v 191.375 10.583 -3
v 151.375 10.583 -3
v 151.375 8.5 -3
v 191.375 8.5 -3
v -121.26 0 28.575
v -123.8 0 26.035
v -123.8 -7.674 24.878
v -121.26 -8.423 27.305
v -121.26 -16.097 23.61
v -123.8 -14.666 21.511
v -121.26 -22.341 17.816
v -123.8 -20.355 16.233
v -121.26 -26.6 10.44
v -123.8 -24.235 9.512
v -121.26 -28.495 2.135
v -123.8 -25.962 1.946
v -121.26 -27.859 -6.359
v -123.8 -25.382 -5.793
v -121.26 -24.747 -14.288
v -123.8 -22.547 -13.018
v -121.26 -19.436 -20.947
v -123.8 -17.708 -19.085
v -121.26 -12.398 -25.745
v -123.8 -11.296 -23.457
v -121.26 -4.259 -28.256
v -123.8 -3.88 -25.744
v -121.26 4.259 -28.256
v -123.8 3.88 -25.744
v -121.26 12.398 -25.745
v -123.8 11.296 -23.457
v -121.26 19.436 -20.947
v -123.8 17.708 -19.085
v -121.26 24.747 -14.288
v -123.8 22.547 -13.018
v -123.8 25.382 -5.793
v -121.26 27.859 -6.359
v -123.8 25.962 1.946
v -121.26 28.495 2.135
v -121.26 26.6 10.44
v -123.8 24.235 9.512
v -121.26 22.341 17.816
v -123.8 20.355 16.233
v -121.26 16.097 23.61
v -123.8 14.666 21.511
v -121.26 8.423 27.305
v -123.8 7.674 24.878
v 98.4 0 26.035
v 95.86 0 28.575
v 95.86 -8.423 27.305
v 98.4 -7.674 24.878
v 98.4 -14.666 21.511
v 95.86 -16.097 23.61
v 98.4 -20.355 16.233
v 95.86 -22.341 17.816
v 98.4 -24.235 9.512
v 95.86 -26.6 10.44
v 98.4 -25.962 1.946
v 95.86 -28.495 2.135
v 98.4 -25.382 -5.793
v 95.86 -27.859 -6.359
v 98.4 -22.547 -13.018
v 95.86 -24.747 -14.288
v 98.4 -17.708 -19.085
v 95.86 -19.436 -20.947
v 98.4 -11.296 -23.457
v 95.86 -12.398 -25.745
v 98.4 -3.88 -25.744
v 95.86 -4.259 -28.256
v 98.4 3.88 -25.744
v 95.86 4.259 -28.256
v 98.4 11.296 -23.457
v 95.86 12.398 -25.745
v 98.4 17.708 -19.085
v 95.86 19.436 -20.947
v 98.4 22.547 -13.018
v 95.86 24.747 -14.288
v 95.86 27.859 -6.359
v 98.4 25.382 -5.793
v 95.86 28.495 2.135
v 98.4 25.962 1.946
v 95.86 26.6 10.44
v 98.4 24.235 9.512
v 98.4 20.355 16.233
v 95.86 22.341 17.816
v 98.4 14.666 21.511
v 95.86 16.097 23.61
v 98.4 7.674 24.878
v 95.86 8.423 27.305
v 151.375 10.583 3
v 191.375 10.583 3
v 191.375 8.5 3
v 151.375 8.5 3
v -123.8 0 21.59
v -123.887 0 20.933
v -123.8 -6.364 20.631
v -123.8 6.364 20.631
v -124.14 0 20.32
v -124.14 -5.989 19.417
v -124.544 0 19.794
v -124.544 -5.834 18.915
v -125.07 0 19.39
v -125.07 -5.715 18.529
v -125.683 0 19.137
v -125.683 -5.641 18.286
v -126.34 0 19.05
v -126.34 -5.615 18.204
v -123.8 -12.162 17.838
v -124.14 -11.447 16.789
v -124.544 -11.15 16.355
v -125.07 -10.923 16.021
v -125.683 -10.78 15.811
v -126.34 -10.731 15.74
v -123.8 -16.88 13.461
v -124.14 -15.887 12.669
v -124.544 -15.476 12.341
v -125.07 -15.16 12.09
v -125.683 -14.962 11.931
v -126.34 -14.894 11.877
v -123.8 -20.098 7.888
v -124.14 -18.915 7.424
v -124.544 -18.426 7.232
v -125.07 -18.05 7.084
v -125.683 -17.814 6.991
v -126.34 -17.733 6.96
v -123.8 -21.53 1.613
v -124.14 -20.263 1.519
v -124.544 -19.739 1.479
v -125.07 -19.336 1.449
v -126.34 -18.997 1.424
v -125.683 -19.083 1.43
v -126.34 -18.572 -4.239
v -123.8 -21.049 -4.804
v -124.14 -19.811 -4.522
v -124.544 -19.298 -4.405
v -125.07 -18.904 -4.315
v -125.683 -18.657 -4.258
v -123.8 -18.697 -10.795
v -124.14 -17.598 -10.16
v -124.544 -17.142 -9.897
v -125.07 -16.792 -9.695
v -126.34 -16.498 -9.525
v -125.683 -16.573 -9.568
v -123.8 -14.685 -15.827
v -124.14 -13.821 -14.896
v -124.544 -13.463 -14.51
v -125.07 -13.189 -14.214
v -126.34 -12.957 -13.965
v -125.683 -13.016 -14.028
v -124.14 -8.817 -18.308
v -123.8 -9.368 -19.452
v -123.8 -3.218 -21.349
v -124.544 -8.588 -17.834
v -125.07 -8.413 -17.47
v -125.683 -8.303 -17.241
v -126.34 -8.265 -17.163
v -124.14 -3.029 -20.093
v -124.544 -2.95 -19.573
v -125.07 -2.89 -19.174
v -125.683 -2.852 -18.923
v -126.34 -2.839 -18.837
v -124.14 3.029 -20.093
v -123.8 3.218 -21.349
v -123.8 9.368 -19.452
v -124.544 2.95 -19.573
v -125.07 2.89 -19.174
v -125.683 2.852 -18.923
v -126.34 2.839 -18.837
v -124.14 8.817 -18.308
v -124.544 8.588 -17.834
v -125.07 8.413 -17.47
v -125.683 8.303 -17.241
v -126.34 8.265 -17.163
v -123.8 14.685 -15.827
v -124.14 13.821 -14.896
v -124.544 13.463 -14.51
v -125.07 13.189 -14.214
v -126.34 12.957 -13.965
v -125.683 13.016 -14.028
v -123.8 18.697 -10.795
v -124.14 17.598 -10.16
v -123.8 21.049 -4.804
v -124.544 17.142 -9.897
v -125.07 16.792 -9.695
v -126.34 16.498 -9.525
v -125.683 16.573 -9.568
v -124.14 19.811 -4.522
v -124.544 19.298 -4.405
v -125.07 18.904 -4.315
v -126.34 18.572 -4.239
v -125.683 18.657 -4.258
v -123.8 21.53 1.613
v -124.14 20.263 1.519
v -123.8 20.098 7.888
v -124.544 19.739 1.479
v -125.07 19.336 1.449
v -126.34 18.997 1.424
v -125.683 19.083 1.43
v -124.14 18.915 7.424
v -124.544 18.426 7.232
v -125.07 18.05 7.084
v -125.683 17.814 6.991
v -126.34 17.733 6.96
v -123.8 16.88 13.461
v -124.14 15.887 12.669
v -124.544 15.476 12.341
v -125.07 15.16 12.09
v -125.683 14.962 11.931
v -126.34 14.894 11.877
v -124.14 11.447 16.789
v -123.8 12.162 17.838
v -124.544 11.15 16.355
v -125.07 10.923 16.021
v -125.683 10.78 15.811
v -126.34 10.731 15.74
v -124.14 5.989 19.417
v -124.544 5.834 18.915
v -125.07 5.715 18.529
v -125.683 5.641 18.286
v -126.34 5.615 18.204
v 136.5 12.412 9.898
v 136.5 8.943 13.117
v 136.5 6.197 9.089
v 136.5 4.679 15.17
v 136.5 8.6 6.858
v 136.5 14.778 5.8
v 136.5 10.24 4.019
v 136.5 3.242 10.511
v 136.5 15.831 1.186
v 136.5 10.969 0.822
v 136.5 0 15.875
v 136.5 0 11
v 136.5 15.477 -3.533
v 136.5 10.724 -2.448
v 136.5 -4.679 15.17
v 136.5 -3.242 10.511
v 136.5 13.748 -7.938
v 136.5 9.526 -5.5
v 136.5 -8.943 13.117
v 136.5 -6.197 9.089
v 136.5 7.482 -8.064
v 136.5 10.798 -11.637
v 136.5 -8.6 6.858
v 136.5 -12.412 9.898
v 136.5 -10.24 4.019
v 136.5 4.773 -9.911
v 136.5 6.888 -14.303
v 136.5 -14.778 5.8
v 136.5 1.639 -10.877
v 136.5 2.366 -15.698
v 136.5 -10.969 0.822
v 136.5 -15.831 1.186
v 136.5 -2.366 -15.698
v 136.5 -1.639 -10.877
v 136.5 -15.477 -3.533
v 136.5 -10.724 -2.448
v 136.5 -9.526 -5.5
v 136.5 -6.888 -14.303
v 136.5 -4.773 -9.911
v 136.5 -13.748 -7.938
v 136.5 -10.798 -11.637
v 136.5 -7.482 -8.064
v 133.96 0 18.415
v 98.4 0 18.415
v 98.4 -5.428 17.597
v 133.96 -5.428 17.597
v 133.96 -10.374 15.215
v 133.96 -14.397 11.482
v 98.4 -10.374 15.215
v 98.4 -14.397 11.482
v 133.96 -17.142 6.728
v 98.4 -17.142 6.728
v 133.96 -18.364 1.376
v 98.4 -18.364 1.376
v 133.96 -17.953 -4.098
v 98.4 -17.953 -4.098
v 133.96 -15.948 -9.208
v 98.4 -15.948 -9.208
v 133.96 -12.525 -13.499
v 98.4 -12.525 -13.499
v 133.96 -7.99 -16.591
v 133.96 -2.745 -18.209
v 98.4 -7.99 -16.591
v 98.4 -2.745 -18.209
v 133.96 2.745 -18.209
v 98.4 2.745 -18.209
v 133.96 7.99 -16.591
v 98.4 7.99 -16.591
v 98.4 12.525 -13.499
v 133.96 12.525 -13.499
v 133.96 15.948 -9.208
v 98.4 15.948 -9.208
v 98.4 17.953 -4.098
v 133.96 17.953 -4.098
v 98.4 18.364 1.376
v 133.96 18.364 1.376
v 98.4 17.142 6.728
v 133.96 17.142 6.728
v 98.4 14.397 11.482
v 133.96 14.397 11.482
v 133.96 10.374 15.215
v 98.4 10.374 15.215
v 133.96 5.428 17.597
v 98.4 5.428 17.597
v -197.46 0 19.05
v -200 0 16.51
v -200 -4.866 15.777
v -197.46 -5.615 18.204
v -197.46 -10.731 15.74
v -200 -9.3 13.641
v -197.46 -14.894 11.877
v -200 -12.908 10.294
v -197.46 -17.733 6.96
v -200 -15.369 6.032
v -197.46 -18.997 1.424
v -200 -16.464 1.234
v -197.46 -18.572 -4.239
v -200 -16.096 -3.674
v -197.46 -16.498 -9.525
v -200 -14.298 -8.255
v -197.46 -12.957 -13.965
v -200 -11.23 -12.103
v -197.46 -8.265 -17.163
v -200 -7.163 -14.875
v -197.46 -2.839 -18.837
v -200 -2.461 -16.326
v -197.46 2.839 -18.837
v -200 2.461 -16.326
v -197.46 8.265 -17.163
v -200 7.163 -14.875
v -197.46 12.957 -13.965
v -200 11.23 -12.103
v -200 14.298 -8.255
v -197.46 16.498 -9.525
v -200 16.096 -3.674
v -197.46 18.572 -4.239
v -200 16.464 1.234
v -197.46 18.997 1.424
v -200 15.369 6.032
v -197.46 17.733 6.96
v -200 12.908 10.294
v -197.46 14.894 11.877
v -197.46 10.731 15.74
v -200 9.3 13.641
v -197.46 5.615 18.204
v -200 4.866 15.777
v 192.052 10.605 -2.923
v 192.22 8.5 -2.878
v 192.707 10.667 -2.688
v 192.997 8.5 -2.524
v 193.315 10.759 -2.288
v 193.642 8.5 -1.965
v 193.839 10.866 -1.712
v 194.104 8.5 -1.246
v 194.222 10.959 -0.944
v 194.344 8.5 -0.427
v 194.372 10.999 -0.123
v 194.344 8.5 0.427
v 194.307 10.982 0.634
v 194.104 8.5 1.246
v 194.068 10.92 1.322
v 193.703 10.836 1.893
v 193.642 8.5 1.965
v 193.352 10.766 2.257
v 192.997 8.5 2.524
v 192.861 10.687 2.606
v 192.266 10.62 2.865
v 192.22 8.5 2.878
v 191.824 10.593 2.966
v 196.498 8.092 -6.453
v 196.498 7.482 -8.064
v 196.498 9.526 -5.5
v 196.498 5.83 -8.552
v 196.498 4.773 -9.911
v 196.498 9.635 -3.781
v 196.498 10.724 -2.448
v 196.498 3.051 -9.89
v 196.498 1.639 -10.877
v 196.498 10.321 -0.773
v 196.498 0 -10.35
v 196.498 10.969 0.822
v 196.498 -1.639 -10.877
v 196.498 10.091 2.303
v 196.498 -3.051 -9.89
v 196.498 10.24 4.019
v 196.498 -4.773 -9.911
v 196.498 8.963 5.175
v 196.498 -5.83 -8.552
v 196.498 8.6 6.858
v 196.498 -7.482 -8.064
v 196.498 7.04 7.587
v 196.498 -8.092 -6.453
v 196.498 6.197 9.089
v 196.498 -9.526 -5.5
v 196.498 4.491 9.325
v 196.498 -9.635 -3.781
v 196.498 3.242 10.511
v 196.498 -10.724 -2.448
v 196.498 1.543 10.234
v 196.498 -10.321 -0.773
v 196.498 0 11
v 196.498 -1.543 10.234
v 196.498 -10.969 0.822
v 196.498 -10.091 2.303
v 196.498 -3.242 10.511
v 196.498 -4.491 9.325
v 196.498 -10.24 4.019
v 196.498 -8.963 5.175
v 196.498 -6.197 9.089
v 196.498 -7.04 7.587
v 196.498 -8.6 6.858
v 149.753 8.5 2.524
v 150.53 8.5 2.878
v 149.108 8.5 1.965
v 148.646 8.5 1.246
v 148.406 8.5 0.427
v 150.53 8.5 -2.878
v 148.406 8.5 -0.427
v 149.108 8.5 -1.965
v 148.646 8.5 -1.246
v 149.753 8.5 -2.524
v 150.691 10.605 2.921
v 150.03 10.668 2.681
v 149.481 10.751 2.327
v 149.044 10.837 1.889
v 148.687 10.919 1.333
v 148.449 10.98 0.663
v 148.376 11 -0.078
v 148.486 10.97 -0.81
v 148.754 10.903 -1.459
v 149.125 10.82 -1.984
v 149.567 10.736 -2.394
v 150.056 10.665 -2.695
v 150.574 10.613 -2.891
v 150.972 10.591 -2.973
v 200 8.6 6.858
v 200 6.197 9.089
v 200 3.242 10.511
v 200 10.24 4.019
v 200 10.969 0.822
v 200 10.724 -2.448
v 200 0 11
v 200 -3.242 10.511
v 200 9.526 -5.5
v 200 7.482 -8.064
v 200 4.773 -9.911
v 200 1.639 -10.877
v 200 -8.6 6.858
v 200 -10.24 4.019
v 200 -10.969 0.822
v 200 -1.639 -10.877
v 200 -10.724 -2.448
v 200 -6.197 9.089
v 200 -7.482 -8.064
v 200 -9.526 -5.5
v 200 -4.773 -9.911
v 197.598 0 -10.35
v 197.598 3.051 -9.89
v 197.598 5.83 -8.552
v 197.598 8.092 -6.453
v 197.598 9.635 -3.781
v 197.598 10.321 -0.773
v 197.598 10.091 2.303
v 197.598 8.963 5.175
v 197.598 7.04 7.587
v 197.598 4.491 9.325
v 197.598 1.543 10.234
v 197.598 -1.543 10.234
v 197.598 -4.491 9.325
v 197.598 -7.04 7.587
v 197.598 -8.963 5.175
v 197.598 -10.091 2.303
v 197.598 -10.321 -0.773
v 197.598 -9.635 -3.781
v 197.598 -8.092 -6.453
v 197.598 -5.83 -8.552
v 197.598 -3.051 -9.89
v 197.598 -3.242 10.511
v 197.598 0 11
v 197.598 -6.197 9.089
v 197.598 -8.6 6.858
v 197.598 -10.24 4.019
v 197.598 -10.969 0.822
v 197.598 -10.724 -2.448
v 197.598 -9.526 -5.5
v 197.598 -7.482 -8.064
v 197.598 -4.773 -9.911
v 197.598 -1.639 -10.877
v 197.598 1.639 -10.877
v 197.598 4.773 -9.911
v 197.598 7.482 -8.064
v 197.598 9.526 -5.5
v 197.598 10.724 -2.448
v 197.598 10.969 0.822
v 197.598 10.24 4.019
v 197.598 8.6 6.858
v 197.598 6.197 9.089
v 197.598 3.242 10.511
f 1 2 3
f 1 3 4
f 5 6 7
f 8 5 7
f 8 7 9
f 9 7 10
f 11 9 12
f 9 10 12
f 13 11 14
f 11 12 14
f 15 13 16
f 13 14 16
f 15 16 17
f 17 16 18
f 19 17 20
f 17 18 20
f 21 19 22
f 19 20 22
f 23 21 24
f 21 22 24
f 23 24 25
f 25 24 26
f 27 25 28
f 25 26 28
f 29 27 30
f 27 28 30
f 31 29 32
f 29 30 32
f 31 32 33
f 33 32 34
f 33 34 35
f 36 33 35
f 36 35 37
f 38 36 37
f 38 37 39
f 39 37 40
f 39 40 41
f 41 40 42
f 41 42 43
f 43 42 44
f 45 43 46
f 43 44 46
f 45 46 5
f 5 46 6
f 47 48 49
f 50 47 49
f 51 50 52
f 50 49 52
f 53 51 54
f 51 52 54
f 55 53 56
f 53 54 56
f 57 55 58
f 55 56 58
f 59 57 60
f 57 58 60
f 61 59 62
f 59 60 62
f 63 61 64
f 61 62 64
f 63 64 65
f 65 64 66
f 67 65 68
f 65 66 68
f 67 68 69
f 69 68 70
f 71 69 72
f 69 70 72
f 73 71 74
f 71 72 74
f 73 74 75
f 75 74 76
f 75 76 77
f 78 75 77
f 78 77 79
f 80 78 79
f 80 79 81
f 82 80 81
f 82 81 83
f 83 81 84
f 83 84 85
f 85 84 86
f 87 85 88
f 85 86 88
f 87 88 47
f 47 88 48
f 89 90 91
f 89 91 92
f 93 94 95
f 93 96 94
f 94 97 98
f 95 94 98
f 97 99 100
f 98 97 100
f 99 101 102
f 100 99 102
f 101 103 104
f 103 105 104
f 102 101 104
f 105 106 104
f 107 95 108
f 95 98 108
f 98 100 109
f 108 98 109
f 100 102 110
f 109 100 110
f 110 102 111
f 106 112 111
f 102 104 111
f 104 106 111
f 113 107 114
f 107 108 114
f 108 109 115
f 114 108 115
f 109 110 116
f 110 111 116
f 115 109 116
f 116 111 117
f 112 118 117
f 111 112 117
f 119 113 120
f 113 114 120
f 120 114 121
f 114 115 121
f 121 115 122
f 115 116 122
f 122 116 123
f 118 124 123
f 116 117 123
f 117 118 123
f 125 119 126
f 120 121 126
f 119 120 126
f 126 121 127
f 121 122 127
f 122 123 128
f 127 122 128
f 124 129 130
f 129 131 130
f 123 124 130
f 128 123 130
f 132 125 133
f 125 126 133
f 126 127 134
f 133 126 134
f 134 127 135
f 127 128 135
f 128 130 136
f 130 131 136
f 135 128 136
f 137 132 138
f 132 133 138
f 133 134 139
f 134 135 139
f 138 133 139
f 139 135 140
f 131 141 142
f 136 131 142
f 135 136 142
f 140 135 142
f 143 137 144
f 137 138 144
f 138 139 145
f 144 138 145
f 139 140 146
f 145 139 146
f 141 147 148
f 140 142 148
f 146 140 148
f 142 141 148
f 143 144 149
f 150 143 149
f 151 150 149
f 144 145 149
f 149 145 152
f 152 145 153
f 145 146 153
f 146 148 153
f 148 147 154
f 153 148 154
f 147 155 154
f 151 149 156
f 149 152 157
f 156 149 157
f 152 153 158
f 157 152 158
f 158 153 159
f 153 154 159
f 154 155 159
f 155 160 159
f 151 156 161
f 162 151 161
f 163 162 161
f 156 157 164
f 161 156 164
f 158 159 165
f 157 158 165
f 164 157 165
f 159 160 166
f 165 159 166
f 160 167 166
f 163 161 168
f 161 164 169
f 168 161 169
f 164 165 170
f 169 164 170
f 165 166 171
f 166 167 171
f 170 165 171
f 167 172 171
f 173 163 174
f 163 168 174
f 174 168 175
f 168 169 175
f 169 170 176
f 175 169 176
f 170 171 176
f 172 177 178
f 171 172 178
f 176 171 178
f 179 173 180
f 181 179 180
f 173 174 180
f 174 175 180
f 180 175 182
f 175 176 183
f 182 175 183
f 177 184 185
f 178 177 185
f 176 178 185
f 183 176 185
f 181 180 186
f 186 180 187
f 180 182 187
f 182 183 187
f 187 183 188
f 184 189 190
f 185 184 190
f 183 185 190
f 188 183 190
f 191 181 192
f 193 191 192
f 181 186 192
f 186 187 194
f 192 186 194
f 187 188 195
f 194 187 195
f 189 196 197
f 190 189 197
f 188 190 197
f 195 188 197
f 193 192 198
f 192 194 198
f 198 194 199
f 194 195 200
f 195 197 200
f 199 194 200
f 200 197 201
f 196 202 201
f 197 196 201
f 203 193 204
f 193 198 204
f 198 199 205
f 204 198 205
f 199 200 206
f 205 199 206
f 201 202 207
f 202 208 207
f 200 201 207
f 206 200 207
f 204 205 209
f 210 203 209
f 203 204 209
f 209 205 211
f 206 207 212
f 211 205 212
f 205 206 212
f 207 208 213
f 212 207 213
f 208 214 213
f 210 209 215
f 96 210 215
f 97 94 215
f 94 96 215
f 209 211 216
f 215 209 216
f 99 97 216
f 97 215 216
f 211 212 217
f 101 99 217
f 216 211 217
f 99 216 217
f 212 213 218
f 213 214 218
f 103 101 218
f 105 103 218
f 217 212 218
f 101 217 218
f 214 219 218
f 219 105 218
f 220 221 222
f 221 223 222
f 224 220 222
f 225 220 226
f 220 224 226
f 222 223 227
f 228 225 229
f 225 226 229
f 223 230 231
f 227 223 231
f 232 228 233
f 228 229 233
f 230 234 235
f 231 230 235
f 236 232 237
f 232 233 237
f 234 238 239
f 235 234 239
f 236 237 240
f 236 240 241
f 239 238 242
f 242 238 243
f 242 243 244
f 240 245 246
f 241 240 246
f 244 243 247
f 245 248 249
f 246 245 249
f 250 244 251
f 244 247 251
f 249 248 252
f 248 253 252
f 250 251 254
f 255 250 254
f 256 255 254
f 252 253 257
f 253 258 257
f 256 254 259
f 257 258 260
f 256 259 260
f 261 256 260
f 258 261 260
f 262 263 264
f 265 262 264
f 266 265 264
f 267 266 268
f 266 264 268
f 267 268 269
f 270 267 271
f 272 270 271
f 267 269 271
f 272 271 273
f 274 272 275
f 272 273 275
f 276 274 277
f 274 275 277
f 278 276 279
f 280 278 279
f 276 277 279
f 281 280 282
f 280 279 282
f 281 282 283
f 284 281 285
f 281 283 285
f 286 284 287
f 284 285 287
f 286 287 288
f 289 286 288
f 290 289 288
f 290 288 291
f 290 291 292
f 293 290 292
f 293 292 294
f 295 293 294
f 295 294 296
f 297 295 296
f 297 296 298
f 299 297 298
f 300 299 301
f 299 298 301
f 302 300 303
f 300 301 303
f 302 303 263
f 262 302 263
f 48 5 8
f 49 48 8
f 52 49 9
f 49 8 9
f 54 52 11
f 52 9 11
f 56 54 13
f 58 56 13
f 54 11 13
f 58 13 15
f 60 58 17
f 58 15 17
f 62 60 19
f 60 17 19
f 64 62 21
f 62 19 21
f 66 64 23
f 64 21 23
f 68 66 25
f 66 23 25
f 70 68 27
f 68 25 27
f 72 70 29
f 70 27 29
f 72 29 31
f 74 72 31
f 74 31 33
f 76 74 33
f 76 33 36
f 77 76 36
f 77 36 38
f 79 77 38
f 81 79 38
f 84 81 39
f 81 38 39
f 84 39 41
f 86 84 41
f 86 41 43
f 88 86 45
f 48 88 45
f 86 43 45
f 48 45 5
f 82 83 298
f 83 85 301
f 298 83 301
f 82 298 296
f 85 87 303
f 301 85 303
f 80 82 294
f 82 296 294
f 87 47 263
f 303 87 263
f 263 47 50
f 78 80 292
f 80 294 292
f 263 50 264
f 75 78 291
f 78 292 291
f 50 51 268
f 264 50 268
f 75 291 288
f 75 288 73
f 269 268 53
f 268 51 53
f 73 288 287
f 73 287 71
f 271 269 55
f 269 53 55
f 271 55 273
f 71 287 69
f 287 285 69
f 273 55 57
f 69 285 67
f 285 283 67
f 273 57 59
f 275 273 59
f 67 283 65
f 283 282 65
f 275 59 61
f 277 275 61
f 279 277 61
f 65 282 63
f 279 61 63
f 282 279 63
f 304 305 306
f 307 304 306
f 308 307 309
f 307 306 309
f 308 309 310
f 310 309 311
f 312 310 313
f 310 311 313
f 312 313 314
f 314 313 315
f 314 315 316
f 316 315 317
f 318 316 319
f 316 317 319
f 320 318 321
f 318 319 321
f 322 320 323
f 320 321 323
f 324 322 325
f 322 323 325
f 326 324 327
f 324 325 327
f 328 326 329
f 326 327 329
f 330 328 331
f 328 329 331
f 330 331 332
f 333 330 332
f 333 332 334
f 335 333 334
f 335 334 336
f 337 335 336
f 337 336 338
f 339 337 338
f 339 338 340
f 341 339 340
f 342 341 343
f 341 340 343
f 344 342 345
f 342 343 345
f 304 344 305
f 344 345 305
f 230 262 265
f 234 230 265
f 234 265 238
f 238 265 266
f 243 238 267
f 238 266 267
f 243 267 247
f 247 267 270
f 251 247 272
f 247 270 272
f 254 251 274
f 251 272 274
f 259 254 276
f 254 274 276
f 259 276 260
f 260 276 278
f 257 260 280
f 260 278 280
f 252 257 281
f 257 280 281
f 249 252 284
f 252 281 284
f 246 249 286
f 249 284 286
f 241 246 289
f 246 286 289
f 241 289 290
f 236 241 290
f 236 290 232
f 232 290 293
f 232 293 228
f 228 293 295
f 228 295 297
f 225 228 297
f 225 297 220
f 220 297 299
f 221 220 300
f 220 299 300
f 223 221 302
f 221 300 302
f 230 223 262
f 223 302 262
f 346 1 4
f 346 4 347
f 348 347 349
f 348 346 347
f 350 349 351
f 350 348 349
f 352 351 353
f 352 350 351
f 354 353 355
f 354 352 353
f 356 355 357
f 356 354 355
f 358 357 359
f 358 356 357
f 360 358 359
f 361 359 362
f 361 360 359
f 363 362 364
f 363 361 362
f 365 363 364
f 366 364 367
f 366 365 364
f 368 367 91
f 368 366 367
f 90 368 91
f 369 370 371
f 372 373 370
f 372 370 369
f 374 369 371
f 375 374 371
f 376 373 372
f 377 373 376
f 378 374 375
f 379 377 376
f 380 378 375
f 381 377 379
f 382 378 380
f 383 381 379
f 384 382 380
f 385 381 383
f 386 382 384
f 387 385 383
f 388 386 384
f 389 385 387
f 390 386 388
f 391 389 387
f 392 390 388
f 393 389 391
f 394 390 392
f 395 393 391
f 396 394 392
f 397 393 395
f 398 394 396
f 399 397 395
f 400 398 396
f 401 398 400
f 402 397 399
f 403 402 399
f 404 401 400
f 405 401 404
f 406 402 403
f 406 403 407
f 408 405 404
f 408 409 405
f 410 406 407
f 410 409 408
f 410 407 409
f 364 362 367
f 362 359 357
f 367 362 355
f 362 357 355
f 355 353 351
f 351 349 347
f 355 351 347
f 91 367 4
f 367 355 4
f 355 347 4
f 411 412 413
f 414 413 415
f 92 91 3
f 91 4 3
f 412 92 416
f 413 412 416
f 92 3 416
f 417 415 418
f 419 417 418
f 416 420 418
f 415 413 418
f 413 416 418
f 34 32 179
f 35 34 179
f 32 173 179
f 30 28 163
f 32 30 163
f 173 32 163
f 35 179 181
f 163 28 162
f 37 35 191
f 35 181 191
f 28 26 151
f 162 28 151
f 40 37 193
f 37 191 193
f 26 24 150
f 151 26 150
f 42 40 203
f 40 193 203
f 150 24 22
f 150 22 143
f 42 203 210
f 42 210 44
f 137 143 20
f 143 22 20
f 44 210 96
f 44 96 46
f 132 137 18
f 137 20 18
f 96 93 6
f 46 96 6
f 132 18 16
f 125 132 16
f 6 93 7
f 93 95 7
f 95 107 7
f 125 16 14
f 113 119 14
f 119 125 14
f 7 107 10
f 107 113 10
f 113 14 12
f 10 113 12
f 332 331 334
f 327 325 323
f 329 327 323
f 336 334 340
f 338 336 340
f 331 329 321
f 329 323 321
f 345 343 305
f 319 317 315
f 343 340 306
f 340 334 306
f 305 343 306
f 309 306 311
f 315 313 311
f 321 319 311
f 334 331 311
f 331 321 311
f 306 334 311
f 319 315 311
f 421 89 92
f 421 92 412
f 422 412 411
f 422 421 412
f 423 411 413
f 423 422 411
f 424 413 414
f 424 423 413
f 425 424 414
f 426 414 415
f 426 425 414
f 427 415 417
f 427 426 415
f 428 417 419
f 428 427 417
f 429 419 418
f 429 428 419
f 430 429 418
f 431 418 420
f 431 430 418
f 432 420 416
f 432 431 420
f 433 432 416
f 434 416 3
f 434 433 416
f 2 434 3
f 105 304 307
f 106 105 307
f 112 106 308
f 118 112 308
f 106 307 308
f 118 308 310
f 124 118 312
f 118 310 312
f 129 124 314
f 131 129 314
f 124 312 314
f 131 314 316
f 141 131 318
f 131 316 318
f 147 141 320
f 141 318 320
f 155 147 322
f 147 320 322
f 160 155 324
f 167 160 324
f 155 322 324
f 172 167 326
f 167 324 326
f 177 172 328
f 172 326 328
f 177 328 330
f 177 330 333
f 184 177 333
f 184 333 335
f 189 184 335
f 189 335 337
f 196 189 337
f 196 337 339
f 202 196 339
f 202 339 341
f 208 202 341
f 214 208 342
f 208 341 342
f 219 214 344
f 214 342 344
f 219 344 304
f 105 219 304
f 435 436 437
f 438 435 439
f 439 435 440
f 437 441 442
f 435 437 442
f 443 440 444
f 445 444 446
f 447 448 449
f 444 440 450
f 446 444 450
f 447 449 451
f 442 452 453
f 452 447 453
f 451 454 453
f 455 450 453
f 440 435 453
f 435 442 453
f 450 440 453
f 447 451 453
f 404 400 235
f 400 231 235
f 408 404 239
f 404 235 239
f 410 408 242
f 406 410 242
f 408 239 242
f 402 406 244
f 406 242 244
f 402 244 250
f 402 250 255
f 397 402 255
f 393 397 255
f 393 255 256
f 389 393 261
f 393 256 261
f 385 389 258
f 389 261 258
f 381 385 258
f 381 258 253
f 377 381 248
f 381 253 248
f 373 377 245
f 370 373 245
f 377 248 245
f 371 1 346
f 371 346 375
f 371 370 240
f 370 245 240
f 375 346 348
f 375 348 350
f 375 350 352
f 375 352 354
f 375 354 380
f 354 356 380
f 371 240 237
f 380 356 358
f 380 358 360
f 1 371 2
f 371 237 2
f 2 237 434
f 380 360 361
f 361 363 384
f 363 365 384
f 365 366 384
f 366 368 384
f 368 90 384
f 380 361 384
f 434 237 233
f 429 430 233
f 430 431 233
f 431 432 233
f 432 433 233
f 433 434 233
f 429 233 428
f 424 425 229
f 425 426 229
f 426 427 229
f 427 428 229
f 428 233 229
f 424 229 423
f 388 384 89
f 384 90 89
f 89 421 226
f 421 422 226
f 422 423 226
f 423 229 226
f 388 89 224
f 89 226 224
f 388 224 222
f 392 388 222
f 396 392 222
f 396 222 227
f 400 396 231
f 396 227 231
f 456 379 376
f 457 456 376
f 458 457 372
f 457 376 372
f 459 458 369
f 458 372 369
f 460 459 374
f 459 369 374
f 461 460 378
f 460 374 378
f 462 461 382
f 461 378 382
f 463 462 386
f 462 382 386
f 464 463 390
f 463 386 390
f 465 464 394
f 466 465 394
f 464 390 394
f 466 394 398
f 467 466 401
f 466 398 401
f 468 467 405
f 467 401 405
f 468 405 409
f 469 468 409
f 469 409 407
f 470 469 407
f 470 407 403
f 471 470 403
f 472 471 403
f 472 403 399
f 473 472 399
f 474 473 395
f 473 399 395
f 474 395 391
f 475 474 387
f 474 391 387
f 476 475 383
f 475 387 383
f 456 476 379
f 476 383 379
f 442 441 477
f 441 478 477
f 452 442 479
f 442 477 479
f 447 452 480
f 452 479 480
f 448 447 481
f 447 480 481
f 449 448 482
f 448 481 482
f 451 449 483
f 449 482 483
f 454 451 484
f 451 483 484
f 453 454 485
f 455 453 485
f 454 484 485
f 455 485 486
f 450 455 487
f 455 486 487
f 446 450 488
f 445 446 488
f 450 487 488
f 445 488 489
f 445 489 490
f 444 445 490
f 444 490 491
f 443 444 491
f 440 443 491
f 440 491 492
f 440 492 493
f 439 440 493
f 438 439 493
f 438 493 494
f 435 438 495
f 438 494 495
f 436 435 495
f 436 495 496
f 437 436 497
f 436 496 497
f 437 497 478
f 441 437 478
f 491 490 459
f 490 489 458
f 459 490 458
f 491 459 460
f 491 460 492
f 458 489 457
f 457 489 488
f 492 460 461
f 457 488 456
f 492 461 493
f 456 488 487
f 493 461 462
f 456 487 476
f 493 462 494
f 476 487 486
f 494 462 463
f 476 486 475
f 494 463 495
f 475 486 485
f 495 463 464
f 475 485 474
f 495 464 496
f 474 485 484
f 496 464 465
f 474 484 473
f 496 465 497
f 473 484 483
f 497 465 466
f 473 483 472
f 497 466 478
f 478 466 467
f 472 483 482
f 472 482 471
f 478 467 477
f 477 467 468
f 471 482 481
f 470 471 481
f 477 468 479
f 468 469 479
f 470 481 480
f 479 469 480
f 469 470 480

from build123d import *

# Parameters (mm, degrees)
CHAMFER1_SIZE      = 2.54
CHAMFER2_SIZE      = 2.54
FILLET1_R          = 2.54
CUT_EXTRUDE2_DEPTH = 2.5
SKETCH7_R          = 11
SKETCH7_R_2        = 10.35
CUT_EXTRUDE3_DEPTH = 1.1


with BuildPart() as part:
    # Sketch1 → Revolve1 (revolve)
    with BuildSketch(Plane.XY, mode=Mode.PRIVATE) as revolve1_sk:
        Polygon((-200, 0), (200, 0), (200, 11), (136.5, 11), (136.5, 18.415), (98.4, 18.415), (98.4, 28.575), (-123.8, 28.575), (-123.8, 19.05), (-200, 19.05), align=None)
    revolve(revolve1_sk.sketch.rotate(Axis((-1910.961105754, 0, 0), (1, 0, 0)), 90), axis=Axis((-1910.961105754, 0, 0), (1, 0, 0)))

    # Chamfer1
    chamfer1_edges = [part.edges().sort_by_distance(p)[0] for p in [
        (136.5, 0, -18.415),
        (98.4, 0, -28.575),
    ]]
    chamfer(chamfer1_edges, length=CHAMFER1_SIZE)

    # Chamfer2
    chamfer2_edges = [part.edges().sort_by_distance(p)[0] for p in [
        (-123.8, 0, -28.575),
        (-200, 0, -19.05),
    ]]
    chamfer(chamfer2_edges, length=CHAMFER2_SIZE)

    # Fillet1
    fillet1_edges = [part.edges().sort_by_distance(p)[0] for p in [
        (-123.8, 0, -19.05),
    ]]
    fillet(fillet1_edges, radius=FILLET1_R)

    # Sketch3 → Cut-Extrude2 (cut)
    with BuildSketch(Plane(origin=(0, 11, 0), x_dir=(1, 0, 0), z_dir=(0, 1, 0))):
        with BuildLine():
            Line((151.375, 3), (191.375, 3))
            ThreePointArc((191.375, 3), (194.375, 0), (191.375, -3))
            Line((191.375, -3), (151.375, -3))
            ThreePointArc((151.375, -3), (148.375, 0), (151.375, 3))
        make_face()
    extrude(amount=-CUT_EXTRUDE2_DEPTH, mode=Mode.SUBTRACT)

    # Sketch7 → Cut-Extrude3 (cut)
    with BuildSketch(Plane(origin=(196.49768, 0, 0), x_dir=(0, 0, -1), z_dir=(1, 0, 0))):
        with Locations(Location((0, 0, 0), (0, 0, 180))):
            Circle(SKETCH7_R)
        Circle(SKETCH7_R_2, mode=Mode.SUBTRACT)
    extrude(amount=CUT_EXTRUDE3_DEPTH, mode=Mode.SUBTRACT)


solid = part.part
